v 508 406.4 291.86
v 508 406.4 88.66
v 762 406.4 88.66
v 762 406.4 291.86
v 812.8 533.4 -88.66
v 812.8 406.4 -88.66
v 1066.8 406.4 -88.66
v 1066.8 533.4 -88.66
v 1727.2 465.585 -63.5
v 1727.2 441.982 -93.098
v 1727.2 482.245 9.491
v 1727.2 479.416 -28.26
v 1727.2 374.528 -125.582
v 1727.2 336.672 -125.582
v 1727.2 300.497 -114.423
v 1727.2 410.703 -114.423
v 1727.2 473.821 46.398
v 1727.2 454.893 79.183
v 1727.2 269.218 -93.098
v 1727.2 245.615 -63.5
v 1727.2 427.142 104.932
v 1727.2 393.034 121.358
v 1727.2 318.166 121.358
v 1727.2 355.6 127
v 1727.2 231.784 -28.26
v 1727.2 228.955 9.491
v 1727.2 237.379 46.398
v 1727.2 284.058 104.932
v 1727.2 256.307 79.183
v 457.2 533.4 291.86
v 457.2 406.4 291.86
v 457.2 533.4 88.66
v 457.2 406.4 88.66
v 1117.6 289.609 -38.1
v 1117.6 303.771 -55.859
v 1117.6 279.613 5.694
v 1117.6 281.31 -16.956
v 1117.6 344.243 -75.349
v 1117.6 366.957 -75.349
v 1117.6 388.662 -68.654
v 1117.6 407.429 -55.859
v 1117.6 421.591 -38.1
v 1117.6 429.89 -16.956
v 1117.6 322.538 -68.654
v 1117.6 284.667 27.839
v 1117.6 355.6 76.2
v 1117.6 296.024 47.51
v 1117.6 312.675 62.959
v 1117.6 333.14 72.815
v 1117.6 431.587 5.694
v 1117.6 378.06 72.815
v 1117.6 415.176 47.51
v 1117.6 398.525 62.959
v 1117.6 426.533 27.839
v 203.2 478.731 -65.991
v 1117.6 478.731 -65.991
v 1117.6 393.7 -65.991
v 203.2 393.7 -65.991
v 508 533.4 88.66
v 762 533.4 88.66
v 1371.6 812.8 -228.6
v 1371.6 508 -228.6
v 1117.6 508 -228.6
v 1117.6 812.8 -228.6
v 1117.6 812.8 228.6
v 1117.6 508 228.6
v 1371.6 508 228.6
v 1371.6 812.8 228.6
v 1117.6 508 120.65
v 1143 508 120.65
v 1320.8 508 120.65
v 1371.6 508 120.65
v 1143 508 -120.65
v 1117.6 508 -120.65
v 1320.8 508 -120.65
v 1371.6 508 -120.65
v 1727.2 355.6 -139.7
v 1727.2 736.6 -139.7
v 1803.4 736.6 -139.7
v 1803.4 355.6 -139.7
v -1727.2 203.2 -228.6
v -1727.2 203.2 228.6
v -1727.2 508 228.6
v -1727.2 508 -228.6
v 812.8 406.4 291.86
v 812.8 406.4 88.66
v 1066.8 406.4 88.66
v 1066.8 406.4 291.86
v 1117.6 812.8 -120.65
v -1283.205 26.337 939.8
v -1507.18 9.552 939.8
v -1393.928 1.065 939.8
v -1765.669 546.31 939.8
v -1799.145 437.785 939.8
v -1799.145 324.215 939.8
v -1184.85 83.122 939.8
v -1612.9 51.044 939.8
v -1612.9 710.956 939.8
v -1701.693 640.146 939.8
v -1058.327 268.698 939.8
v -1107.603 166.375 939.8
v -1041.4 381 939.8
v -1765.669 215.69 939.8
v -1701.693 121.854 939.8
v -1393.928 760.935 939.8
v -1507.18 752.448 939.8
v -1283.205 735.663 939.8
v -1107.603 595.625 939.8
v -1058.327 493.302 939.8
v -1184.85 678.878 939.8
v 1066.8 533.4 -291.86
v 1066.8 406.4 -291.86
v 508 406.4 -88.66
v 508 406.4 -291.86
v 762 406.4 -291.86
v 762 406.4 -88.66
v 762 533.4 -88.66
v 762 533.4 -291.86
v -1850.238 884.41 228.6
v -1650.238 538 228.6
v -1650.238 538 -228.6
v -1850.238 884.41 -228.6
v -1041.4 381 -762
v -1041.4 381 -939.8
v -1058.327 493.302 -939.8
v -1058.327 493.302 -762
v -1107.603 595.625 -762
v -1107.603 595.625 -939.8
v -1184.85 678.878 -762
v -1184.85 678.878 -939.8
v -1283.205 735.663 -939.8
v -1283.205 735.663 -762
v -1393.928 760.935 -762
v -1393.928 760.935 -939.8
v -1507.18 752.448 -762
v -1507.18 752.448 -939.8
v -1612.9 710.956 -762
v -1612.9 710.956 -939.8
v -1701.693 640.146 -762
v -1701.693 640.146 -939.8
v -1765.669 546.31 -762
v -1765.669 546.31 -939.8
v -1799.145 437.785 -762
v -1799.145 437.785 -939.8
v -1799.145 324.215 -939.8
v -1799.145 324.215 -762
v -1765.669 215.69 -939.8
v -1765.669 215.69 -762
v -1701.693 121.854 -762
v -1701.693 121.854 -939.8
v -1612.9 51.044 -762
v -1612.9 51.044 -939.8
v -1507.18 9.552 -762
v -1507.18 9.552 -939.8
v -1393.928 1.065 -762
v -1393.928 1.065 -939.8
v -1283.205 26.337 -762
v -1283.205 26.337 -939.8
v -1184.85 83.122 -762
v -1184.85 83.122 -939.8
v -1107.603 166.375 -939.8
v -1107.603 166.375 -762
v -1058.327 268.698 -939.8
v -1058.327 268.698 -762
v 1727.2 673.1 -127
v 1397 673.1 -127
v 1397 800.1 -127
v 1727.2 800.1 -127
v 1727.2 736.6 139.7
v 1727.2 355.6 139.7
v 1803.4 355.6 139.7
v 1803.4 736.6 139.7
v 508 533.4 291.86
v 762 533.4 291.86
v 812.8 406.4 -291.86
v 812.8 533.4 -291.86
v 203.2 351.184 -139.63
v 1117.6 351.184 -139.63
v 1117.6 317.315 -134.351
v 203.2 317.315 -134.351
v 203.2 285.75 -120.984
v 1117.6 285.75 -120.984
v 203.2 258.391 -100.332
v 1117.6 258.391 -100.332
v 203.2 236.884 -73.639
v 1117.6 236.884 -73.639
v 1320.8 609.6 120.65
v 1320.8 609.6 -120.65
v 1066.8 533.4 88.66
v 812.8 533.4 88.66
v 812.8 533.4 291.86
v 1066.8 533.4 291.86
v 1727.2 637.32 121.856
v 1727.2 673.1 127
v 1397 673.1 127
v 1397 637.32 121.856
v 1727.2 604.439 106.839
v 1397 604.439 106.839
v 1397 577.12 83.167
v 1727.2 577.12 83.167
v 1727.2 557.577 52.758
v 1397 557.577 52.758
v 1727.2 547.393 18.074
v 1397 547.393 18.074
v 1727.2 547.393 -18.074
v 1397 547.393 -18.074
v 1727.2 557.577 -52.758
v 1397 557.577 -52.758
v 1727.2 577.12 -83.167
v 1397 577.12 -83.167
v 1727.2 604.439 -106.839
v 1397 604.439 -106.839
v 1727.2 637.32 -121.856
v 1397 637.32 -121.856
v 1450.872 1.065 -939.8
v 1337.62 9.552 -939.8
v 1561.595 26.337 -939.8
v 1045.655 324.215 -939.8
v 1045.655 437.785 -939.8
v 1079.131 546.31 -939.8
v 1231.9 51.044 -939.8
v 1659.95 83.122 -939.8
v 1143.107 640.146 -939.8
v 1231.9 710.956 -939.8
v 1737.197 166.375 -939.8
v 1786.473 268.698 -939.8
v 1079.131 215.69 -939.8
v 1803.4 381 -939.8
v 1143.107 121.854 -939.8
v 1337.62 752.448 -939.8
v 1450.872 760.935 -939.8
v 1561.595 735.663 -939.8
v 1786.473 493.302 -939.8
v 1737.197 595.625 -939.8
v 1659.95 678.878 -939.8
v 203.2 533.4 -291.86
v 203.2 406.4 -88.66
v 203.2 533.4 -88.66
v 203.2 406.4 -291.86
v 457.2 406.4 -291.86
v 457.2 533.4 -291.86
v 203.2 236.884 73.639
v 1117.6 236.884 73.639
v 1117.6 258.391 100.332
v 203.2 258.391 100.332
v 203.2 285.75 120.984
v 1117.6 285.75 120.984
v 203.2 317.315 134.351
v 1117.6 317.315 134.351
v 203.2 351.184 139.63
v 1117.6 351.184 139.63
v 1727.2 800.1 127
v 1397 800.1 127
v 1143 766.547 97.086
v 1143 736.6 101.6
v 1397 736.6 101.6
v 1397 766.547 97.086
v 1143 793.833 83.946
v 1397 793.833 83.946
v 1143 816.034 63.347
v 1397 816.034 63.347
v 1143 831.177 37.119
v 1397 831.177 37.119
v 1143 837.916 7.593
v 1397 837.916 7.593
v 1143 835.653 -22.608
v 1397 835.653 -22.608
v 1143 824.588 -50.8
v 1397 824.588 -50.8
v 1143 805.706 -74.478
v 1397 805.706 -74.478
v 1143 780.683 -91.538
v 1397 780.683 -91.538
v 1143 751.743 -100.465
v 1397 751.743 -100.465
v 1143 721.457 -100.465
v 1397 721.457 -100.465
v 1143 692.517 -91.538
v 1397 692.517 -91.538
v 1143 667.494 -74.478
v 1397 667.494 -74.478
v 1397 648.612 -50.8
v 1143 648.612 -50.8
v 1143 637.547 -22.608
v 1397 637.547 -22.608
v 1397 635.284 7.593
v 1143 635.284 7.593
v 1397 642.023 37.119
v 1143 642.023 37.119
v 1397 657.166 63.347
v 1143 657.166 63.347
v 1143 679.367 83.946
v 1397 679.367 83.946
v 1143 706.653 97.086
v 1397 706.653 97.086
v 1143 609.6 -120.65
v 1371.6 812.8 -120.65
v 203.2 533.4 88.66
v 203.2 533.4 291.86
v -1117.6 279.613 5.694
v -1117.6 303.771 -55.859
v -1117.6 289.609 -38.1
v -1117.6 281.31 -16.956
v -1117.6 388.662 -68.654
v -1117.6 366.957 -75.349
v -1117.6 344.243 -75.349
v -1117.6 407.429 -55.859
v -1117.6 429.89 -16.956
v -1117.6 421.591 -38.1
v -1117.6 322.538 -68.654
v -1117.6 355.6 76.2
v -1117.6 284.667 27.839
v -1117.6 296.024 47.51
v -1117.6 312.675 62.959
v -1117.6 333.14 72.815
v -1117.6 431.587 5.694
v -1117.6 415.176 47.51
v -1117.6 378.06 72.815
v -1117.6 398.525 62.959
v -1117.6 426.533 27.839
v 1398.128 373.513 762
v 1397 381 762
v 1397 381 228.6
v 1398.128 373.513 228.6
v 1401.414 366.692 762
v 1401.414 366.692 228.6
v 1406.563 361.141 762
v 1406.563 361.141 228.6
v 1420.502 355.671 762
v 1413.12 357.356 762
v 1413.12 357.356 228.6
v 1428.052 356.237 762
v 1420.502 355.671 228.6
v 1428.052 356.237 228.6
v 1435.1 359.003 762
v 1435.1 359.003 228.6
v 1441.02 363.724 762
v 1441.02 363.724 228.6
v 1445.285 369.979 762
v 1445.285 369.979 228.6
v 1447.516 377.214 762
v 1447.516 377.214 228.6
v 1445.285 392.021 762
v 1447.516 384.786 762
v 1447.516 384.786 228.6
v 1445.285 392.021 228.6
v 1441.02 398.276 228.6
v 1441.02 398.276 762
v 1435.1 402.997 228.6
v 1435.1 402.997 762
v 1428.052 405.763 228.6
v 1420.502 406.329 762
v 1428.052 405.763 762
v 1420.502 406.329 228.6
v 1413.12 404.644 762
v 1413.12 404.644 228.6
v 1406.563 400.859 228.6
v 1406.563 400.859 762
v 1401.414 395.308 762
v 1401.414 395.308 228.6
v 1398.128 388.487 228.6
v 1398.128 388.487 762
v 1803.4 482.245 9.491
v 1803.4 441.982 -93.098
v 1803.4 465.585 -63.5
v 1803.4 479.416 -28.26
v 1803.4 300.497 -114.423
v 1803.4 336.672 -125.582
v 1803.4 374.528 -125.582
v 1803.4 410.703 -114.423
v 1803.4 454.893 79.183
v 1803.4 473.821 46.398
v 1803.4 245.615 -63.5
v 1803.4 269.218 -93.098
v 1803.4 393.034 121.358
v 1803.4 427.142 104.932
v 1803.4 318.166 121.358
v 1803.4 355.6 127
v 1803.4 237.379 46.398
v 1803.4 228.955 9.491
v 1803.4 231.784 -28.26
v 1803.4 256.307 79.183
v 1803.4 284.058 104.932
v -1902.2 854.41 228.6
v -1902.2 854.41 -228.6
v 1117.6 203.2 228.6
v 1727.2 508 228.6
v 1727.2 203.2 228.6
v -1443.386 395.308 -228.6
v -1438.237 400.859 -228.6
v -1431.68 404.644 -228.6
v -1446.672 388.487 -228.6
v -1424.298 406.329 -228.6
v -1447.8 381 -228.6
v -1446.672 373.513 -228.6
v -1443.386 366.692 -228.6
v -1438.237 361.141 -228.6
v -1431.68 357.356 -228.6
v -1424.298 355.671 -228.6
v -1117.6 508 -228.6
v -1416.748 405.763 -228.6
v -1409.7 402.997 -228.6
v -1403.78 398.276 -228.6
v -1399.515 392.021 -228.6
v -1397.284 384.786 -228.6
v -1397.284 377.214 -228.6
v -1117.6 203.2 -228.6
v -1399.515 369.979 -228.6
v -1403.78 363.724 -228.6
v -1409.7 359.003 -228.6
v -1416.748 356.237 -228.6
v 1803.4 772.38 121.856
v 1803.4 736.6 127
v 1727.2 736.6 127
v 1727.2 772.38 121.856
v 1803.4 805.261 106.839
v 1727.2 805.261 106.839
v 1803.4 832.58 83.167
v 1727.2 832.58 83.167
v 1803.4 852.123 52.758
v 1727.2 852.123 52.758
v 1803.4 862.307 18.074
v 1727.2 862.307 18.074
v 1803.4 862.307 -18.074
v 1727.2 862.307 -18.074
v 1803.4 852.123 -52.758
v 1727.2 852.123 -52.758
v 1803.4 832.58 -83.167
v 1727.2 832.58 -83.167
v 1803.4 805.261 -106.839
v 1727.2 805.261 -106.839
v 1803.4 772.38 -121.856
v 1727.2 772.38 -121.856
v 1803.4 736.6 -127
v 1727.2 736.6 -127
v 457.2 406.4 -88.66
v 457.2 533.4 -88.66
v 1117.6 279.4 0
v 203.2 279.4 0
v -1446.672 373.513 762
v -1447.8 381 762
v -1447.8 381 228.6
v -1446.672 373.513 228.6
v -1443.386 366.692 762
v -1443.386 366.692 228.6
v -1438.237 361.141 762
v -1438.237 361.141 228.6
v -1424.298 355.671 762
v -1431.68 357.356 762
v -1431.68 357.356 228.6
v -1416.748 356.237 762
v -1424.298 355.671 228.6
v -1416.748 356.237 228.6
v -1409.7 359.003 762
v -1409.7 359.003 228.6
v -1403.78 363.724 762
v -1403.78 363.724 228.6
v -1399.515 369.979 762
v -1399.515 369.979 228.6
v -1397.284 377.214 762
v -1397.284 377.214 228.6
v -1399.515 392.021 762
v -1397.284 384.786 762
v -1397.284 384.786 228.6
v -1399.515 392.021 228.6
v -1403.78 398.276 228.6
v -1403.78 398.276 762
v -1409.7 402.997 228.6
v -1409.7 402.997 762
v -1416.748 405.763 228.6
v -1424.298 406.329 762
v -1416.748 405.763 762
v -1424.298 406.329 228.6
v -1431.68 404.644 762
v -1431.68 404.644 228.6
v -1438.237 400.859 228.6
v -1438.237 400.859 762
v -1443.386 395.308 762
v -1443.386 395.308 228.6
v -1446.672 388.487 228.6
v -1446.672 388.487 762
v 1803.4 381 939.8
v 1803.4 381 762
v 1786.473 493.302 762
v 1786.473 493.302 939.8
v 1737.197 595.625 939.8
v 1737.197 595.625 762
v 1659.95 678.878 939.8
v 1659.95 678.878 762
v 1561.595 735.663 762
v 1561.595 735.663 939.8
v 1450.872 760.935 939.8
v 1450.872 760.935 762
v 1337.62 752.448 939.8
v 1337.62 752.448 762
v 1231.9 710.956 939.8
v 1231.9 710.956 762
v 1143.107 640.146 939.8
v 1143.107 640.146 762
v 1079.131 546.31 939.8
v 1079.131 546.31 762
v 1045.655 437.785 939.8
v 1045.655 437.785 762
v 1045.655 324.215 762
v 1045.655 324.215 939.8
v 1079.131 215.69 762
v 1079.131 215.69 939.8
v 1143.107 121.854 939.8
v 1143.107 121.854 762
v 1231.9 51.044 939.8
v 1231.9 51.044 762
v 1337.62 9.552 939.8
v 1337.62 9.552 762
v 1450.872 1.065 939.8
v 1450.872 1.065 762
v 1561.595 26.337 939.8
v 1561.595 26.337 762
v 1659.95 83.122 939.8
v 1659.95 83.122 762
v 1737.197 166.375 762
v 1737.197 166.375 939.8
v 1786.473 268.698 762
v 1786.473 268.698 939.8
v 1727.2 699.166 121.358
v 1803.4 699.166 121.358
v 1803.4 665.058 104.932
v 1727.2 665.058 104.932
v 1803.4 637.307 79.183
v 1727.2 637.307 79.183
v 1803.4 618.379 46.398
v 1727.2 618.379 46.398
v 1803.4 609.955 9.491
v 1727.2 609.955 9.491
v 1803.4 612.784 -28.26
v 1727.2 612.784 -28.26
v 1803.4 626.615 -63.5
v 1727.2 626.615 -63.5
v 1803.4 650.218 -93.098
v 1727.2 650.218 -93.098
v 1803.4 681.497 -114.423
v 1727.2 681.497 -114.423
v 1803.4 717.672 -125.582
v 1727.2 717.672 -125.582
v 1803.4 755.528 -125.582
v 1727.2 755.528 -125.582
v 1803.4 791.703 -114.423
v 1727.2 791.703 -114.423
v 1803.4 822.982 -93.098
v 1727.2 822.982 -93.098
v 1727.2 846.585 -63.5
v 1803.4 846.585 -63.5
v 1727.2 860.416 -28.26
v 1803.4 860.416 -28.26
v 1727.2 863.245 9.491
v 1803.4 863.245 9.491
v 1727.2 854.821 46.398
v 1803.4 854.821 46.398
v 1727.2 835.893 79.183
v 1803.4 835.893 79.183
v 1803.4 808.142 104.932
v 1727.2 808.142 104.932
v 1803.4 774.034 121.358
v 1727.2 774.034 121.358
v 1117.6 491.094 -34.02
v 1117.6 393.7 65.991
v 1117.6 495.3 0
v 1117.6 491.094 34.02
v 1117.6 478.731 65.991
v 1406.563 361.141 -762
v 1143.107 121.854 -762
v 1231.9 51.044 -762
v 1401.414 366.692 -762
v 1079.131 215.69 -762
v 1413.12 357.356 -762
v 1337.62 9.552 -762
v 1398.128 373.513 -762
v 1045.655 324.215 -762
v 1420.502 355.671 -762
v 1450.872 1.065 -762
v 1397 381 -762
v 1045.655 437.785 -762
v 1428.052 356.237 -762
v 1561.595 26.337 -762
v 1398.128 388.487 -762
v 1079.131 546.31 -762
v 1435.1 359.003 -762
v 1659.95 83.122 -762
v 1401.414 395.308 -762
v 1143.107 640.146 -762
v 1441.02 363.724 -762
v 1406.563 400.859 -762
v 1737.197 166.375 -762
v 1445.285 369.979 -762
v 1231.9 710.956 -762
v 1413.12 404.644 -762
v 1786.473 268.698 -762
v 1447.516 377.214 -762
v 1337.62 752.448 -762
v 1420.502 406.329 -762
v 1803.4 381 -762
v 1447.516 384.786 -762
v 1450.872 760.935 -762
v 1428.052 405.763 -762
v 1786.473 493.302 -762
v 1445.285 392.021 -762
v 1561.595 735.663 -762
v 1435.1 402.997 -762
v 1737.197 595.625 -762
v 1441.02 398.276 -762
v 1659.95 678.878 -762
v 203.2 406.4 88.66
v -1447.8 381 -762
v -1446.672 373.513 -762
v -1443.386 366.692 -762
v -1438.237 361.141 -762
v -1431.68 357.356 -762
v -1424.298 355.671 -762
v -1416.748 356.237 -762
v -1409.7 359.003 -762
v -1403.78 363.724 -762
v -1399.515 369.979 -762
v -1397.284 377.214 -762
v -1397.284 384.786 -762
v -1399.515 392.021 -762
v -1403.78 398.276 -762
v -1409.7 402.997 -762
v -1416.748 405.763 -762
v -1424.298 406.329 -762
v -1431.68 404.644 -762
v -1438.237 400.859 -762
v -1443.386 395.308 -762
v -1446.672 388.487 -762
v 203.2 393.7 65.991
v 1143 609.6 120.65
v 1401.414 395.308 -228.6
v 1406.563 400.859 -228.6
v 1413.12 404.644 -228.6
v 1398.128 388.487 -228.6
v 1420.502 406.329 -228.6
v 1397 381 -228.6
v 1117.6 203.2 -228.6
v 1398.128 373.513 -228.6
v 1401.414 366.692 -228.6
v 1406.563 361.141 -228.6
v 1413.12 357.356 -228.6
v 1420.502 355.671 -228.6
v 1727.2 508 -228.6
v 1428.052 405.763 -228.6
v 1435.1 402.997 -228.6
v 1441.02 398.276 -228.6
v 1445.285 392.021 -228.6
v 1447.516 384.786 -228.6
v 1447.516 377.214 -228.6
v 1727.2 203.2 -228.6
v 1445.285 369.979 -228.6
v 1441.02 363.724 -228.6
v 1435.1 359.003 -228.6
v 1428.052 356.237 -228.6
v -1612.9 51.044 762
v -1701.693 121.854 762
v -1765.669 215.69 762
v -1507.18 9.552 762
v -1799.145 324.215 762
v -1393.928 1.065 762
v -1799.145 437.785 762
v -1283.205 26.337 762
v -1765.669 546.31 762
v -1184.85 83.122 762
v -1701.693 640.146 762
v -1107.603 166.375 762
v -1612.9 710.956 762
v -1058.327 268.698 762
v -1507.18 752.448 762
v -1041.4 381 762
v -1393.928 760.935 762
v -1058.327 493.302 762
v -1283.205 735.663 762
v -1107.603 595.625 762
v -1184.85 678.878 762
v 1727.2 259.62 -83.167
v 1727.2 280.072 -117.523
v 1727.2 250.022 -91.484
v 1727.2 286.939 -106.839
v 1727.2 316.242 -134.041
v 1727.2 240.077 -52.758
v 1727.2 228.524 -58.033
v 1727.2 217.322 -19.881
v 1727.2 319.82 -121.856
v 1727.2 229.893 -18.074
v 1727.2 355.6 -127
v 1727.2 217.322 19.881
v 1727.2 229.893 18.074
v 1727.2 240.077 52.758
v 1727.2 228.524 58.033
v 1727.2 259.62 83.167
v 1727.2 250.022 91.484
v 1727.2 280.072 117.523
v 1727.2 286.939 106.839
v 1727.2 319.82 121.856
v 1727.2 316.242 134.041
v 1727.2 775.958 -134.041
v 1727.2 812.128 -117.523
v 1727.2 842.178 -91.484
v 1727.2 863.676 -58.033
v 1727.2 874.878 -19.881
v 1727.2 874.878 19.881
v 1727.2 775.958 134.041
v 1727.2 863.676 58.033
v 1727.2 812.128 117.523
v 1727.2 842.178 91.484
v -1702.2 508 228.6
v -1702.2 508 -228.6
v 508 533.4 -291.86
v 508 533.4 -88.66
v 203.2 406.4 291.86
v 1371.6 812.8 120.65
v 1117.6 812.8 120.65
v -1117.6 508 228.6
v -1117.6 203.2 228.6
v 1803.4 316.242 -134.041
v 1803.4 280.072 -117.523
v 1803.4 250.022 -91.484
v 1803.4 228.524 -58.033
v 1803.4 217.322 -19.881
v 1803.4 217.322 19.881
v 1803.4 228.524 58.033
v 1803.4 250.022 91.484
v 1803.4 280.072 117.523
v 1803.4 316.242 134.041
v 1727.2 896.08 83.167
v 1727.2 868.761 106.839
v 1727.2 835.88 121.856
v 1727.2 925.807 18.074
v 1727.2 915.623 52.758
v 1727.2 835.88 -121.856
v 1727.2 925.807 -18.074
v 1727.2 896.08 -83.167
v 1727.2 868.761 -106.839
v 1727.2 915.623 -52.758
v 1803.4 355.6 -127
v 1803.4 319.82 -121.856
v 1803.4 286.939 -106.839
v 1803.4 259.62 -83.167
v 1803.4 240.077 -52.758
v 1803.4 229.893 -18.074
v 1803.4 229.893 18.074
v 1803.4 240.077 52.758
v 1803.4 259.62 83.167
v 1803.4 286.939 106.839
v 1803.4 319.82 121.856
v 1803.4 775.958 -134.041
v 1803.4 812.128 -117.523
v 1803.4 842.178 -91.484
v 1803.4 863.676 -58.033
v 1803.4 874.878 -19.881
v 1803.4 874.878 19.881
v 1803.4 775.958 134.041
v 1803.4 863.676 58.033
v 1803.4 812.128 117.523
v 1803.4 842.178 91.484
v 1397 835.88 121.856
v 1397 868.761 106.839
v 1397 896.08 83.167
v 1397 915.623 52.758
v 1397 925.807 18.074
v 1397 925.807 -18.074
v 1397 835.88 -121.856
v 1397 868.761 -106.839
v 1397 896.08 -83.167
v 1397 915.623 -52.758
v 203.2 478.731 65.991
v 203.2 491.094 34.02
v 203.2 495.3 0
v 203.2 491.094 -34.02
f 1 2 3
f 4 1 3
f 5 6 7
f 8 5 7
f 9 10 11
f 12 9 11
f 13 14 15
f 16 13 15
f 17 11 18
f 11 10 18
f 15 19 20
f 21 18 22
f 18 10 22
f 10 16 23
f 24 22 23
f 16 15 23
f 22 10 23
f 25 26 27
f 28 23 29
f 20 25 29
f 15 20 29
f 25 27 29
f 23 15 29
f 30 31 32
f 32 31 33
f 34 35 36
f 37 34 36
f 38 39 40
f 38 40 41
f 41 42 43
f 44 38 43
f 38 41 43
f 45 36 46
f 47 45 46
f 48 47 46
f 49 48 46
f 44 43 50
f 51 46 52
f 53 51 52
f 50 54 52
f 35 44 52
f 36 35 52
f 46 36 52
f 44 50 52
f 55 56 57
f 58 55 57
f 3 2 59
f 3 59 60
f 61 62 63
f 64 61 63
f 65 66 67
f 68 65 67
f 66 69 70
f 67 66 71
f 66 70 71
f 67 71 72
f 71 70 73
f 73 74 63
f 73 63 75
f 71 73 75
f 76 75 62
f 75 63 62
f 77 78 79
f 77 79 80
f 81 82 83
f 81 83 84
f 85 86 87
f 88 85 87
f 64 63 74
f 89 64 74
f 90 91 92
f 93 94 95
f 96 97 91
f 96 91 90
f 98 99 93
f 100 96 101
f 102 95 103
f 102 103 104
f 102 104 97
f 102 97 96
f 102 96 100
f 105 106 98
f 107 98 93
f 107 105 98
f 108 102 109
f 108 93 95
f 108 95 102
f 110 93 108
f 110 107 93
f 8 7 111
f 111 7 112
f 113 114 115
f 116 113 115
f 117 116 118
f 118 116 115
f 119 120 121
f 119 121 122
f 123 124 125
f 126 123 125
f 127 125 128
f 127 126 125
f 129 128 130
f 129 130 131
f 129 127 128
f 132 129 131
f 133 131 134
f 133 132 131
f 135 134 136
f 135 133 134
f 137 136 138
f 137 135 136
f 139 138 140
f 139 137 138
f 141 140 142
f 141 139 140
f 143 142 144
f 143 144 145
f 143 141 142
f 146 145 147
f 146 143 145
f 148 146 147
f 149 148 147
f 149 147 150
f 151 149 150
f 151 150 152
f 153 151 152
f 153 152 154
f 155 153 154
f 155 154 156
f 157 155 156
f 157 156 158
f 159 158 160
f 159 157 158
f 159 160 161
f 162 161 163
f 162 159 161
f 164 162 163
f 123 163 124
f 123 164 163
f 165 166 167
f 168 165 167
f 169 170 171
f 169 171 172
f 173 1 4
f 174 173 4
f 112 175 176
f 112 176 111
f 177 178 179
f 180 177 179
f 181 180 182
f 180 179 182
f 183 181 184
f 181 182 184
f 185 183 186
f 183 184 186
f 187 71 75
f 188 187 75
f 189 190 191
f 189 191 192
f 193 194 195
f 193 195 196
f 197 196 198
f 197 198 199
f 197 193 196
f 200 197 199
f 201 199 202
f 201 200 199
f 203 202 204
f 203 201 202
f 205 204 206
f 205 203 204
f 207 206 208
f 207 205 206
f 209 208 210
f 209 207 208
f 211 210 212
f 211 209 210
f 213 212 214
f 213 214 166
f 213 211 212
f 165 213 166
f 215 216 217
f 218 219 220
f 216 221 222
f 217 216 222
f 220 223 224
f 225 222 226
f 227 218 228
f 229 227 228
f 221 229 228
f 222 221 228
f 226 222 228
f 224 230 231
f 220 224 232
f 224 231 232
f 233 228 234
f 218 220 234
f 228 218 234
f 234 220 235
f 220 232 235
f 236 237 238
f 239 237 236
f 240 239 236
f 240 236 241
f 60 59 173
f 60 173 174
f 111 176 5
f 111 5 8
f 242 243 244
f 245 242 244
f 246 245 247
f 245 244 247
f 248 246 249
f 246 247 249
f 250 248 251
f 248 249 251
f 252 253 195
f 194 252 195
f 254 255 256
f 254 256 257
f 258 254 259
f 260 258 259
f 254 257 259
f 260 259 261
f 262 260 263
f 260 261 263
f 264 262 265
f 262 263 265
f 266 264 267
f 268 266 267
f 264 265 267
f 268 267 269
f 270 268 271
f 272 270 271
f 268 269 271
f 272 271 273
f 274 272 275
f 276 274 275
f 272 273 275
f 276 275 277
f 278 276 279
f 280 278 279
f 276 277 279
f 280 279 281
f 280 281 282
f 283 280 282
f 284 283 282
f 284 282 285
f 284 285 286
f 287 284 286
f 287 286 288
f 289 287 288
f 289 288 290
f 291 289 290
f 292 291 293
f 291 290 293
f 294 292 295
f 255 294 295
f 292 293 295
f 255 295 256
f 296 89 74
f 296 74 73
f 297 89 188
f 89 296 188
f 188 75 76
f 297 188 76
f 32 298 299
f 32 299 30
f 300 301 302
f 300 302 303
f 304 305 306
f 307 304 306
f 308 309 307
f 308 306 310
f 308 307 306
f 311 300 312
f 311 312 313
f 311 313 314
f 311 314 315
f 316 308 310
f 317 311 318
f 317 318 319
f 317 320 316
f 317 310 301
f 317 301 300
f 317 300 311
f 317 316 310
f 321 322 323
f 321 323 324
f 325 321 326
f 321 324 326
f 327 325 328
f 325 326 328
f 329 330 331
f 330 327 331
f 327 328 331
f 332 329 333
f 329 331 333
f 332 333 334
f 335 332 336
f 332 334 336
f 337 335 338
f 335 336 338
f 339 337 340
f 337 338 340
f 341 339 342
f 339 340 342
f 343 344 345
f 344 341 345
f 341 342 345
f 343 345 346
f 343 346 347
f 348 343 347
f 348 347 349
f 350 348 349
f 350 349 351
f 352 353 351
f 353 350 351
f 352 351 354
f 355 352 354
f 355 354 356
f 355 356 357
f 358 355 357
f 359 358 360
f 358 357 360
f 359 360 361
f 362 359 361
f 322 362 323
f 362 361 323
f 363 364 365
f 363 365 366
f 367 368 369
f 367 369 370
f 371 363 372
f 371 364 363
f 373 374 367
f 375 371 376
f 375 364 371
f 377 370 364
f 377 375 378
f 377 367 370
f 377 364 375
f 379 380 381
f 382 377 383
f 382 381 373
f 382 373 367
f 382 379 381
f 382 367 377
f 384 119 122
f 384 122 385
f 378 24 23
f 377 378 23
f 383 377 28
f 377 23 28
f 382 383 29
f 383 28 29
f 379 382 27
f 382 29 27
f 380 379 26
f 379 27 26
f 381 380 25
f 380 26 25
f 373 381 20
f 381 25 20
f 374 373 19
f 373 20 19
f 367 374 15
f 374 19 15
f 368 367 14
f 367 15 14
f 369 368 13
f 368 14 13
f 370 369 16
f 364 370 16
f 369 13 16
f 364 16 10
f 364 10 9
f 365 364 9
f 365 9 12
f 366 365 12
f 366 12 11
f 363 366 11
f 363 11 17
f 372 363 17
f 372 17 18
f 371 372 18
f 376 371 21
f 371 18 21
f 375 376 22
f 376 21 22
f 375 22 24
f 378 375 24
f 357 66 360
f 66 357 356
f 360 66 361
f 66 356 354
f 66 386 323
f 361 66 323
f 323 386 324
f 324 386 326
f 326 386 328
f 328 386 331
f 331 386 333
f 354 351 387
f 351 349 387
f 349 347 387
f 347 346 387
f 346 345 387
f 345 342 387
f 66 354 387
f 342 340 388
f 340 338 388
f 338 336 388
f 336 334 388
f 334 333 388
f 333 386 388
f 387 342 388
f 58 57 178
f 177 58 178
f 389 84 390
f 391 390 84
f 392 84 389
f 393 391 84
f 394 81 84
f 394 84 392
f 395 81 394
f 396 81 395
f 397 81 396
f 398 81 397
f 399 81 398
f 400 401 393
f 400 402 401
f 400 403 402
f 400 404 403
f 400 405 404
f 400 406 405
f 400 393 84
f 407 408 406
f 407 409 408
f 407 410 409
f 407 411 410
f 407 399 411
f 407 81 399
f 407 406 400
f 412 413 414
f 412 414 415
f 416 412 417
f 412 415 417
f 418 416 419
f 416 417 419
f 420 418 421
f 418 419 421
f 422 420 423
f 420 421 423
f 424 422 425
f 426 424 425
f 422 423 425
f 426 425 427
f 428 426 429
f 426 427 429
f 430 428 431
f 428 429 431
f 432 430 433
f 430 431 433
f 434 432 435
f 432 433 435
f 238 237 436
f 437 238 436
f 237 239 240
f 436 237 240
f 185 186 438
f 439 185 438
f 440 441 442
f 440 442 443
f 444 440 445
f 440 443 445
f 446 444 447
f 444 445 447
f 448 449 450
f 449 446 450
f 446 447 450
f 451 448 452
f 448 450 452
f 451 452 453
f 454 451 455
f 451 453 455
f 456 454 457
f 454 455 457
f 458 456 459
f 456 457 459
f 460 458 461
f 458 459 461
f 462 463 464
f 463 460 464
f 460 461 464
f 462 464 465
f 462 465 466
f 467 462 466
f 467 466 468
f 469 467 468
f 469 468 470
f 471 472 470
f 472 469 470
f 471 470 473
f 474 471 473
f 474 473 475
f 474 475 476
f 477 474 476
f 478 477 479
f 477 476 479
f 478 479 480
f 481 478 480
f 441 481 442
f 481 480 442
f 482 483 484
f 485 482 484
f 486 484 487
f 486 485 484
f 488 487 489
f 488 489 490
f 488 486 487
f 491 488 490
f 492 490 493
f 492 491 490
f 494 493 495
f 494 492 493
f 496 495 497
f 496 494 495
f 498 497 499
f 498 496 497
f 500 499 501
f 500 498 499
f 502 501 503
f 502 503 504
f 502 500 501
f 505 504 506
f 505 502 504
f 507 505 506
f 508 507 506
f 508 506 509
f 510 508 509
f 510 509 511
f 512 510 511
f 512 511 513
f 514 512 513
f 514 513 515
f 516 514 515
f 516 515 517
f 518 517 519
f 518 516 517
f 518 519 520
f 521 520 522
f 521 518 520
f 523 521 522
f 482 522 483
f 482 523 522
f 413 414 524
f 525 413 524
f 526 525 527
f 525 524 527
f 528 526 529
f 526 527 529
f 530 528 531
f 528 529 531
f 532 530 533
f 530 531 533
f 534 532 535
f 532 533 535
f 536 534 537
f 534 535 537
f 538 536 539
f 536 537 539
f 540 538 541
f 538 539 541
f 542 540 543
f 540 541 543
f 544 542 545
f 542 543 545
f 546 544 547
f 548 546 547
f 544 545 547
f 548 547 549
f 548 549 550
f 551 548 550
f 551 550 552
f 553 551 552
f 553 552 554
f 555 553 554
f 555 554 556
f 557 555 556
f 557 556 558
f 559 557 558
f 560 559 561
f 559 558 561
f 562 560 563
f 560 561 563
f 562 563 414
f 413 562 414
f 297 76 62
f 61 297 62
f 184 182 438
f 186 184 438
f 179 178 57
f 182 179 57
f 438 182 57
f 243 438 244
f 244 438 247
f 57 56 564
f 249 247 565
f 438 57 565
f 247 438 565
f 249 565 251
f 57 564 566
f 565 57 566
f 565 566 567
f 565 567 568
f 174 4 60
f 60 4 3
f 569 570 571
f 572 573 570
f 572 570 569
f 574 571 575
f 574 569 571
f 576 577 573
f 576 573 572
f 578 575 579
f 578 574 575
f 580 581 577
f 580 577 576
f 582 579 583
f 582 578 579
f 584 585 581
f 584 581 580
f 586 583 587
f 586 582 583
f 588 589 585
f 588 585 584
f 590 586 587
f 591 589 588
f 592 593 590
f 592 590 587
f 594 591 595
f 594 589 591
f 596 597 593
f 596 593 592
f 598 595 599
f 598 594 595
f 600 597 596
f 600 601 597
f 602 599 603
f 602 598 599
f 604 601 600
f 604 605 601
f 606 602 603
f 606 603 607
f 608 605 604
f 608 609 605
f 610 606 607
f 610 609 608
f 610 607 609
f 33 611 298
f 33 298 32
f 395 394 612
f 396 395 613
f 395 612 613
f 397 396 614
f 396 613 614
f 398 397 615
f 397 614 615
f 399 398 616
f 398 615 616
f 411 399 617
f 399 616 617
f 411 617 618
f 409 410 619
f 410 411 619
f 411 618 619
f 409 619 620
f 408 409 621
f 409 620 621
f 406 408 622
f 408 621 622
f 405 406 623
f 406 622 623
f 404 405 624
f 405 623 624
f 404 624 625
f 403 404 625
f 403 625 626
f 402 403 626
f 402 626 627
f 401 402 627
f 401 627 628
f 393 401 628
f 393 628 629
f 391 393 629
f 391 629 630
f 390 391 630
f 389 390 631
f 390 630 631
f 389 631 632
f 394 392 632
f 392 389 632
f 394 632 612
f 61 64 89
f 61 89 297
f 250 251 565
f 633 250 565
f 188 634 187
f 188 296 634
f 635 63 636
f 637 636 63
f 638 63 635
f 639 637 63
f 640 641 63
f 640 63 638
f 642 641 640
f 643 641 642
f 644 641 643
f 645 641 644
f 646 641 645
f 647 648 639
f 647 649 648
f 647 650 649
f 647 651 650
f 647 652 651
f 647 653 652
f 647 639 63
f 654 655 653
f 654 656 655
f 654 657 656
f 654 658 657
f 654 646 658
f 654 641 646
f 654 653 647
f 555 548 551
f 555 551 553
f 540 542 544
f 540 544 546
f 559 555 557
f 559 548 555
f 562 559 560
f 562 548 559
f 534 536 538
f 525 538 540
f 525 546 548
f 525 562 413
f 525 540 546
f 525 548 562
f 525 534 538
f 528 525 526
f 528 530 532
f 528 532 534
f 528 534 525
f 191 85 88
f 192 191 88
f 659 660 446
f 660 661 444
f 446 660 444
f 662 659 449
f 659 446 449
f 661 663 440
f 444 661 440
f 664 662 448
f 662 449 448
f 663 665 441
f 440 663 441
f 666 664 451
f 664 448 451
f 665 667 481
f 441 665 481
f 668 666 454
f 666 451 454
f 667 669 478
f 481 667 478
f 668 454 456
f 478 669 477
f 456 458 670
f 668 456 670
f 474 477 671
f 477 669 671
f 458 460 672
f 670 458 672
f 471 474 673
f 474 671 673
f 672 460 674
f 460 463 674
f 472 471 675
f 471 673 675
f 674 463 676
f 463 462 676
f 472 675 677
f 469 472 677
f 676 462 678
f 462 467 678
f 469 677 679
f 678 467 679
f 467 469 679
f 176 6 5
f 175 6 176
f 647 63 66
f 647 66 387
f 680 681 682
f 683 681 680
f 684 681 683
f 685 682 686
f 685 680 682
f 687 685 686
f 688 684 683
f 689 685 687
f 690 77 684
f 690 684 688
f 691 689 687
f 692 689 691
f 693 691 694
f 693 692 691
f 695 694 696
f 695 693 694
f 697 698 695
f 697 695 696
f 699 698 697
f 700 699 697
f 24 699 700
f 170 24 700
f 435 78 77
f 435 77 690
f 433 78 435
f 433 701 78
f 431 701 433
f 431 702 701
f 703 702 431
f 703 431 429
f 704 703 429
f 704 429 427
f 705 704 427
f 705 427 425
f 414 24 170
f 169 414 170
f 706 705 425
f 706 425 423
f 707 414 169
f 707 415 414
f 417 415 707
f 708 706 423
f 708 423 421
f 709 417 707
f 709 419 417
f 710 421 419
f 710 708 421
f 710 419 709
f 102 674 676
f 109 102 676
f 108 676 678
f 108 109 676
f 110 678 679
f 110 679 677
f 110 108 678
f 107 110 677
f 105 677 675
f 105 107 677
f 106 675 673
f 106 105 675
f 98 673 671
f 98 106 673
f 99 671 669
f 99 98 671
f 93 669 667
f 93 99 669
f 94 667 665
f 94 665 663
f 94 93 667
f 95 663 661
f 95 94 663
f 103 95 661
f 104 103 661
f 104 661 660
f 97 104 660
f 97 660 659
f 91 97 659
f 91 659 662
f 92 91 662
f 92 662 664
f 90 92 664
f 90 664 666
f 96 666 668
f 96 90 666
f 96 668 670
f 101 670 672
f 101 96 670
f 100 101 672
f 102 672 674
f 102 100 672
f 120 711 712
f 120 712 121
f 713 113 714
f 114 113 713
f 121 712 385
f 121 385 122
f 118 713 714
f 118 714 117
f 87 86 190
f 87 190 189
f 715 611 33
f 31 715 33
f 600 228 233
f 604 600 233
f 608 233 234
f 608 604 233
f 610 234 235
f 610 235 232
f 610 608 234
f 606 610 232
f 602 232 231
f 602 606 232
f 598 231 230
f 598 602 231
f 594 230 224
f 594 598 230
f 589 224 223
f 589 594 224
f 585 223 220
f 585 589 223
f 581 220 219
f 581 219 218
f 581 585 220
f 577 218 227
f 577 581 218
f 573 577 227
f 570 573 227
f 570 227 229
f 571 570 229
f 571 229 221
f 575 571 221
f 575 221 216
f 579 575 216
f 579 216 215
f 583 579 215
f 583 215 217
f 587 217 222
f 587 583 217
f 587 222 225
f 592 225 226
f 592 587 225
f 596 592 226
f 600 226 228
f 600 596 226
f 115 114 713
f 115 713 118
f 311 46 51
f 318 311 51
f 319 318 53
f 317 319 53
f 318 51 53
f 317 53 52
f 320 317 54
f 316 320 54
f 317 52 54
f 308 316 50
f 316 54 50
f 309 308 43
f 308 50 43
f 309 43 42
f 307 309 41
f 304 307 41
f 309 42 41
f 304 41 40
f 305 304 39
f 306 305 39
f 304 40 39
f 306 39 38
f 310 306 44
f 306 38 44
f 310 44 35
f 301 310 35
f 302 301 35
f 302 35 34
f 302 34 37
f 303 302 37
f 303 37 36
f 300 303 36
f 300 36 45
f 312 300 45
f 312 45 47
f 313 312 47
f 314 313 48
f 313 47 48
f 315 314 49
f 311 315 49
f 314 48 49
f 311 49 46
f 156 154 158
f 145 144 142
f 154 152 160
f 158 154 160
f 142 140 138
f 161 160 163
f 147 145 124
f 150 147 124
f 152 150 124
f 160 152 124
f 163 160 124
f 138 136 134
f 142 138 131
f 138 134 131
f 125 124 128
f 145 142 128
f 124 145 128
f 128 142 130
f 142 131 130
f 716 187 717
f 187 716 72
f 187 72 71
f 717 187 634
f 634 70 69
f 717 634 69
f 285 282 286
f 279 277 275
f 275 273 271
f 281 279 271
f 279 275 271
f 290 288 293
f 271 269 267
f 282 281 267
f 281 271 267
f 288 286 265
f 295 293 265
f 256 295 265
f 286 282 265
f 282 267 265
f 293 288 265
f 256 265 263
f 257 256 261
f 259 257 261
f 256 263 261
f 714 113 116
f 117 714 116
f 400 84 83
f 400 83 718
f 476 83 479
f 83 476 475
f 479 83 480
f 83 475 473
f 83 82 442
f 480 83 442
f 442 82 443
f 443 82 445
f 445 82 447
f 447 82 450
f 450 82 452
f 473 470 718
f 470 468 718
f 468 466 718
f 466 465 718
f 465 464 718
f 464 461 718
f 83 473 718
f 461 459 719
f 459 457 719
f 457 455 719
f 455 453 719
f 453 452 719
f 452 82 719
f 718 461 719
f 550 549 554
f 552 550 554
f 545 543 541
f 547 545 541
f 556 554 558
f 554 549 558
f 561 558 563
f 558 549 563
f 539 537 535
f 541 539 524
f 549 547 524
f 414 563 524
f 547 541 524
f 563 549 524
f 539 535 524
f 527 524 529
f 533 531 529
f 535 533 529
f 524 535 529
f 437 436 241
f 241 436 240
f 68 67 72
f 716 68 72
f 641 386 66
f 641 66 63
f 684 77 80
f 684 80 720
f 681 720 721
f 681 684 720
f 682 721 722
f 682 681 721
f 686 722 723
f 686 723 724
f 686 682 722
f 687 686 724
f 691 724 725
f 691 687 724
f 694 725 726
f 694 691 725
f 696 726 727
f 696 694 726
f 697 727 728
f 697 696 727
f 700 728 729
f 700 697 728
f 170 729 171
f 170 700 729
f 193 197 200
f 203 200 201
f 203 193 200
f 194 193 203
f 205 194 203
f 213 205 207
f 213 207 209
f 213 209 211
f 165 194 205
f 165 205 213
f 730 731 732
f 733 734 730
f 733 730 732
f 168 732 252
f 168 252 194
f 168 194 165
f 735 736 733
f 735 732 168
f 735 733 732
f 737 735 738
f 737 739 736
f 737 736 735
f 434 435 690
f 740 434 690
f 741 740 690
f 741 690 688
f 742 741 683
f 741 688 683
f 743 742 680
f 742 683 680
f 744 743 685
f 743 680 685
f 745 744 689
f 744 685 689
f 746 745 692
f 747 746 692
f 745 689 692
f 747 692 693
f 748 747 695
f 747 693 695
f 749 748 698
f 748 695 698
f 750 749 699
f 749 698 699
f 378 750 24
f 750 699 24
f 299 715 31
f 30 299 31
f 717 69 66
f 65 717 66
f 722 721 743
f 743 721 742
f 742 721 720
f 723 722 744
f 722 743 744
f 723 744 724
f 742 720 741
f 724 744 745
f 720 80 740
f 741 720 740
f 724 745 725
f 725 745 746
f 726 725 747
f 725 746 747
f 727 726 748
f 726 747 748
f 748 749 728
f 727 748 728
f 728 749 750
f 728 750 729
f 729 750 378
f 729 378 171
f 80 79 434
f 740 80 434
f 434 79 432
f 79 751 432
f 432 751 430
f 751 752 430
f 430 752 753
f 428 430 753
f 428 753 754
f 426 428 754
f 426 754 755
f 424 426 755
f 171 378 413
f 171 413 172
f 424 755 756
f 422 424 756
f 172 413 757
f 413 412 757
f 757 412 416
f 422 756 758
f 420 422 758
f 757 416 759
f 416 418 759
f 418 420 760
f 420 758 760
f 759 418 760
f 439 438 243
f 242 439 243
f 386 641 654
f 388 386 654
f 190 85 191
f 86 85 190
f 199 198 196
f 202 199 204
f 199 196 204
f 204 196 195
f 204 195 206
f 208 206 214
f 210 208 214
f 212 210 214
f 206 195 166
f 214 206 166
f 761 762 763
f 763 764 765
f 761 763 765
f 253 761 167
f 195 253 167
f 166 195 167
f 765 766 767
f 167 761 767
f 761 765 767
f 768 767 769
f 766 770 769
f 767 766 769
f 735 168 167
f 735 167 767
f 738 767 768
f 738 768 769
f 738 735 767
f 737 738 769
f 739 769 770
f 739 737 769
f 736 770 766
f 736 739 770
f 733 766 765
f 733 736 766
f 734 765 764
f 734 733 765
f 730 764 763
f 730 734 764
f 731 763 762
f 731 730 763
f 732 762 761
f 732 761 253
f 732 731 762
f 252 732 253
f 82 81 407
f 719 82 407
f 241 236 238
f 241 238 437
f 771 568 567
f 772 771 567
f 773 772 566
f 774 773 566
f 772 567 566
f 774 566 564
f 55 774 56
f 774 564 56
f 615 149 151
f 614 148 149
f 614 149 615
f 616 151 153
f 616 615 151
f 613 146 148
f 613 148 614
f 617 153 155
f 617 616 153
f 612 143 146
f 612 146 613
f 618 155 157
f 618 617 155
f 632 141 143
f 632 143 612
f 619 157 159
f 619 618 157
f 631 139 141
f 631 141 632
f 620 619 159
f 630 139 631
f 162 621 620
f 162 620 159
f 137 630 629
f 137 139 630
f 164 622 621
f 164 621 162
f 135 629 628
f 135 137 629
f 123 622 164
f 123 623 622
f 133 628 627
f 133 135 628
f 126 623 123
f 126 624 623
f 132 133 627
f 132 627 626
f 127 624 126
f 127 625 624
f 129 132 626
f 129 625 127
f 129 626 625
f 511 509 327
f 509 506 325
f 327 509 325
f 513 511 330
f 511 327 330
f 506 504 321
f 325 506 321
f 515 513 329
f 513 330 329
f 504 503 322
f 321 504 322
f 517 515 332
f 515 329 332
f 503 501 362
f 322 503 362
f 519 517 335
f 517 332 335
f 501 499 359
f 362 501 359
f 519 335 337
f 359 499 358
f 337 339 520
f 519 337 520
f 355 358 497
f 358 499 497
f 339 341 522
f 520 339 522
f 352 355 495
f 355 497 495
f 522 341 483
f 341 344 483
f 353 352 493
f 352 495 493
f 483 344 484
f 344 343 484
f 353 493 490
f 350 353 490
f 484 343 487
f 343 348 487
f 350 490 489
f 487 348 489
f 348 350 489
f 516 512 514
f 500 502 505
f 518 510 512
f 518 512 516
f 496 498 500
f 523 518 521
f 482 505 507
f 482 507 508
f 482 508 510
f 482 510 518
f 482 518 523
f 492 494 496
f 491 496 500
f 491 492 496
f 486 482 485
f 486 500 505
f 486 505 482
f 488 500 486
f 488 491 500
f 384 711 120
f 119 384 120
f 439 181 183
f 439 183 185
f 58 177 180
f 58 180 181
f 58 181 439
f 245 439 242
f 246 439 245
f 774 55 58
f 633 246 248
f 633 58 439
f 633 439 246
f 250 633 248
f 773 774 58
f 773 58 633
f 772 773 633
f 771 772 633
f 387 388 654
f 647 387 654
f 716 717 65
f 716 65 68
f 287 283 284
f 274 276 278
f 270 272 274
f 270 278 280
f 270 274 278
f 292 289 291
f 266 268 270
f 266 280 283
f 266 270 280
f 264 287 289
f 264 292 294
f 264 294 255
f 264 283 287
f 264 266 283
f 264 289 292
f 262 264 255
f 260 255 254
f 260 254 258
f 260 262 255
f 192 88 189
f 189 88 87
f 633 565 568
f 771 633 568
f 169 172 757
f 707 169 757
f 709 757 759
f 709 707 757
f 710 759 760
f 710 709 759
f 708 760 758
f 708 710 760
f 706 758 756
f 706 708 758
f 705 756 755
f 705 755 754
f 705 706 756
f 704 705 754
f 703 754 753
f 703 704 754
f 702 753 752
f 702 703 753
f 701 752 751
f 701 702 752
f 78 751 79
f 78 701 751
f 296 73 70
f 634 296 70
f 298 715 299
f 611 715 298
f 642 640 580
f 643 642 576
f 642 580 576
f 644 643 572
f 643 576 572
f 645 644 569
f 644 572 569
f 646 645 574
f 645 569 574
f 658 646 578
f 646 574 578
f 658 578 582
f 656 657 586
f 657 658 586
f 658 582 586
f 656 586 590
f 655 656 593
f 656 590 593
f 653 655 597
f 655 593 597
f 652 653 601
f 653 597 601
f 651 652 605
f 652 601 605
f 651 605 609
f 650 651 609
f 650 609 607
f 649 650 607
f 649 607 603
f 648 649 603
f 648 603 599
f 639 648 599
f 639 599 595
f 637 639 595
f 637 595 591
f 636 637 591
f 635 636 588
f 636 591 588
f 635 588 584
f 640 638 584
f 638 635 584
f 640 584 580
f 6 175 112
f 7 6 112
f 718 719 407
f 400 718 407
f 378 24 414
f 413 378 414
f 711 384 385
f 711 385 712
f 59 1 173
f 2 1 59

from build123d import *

# Parameters (mm, degrees)
SKETCH4_R              = 381
BOSS_EXTRUDE1_DEPTH    = 88.9
BOSS_EXTRUDE1_2_DEPTH  = 88.9
SKETCH3_R              = 381
BOSS_EXTRUDE2_DEPTH    = 88.9
BOSS_EXTRUDE2_2_DEPTH  = 88.9
BOSS_EXTRUDE3_START    = 203.2
SKETCH1_W              = 609.6
SKETCH1_H              = 457.2
BOSS_EXTRUDE3_DEPTH    = 304.8
BOSS_EXTRUDE3_2_DEPTH  = 304.8
SKETCH5_R              = 76.2
BOSS_EXTRUDE4_DEPTH    = 914.4
SKETCH5_3_R            = 76.2
BOSS_EXTRUDE5_DEPTH    = 2235.2
SKETCH6_R              = 127
BOSS_EXTRUDE6_DEPTH    = 76.2
BOSS_EXTRUDE6_2_DEPTH  = 76.2
BOSS_EXTRUDE8_DEPTH    = 330.2
SKETCH9_R              = 101.6
BOSS_EXTRUDE9_DEPTH    = 254
BOSS_EXTRUDE10_DEPTH   = 76.2
SKETCH11_W             = 254
SKETCH11_H             = 203.2
BOSS_EXTRUDE11_DEPTH   = 127
BOSS_EXTRUDE11_2_DEPTH = 127
BOSS_EXTRUDE11_3_DEPTH = 127
BOSS_EXTRUDE11_4_DEPTH = 127
BOSS_EXTRUDE11_5_DEPTH = 127
BOSS_EXTRUDE11_6_DEPTH = 127
BOSS_EXTRUDE12_DEPTH   = 304.8
BOSS_EXTRUDE12_2_DEPTH = 304.8
SKETCH12_3_W           = 177.8
SKETCH12_3_H           = 120.65
BOSS_EXTRUDE13_DEPTH   = 101.6
BOSS_EXTRUDE15_REACH   = 2649.242
SKETCH13_R             = 25.4
BOSS_EXTRUDE16_DEPTH   = 457.2


with BuildPart() as part:
    # Sketch4 → Boss-Extrude1 (new, symmetric)
    with BuildSketch(Plane.XY.offset(-850.9)):
        with Locations((1422.4, 381)):
            Circle(SKETCH4_R)
    extrude(amount=BOSS_EXTRUDE1_DEPTH, both=True)


with BuildPart() as body_2:
    # Sketch4 → Boss-Extrude1 2 (new, symmetric)
    with BuildSketch(Plane.XY.offset(-850.9)):
        with Locations((-1422.4, 381)):
            Circle(SKETCH4_R)
    extrude(amount=BOSS_EXTRUDE1_2_DEPTH, both=True)


with BuildPart() as body_3:
    # Sketch3 → Boss-Extrude2 (new, symmetric)
    with BuildSketch(Plane.XY.offset(850.9)):
        with Locations((1422.4, 381)):
            Circle(SKETCH3_R)
    extrude(amount=BOSS_EXTRUDE2_DEPTH, both=True)


with BuildPart() as body_4:
    # Sketch3 → Boss-Extrude2 2 (new, symmetric)
    with BuildSketch(Plane.XY.offset(850.9)):
        with Locations((-1422.4, 381)):
            Circle(SKETCH3_R)
    extrude(amount=BOSS_EXTRUDE2_2_DEPTH, both=True)

    # Boss-Extrude15: up to this face of the body (flat: up to its plane)
    boss_extrude15_end = Plane(body_4.part.faces().sort_by_distance((-1422.4, 381, 762))[0])
    # Sketch13 → Boss-Extrude15 (add, up to the picked face)
    with BuildSketch(Plane.XY.offset(-762), mode=Mode.PRIVATE) as boss_extrude15_sk1:
        with Locations(Location((-1422.4, 381, 0), (0, 0, 180))):
            Circle(SKETCH13_R)
    boss_extrude15_tool1 = split(extrude(boss_extrude15_sk1.sketch, amount=BOSS_EXTRUDE15_REACH, mode=Mode.PRIVATE), bisect_by=boss_extrude15_end, keep=Keep.BOTH, mode=Mode.PRIVATE)
    # Sketch13 → Boss-Extrude15 (add, up to the picked face)
    with BuildSketch(Plane.XY.offset(-762), mode=Mode.PRIVATE) as boss_extrude15_sk2:
        with Locations(Location((1422.4, 381, 0), (0, 0, 180))):
            Circle(SKETCH13_R)
    boss_extrude15_tool2 = split(extrude(boss_extrude15_sk2.sketch, amount=BOSS_EXTRUDE15_REACH, mode=Mode.PRIVATE), bisect_by=boss_extrude15_end, keep=Keep.BOTH, mode=Mode.PRIVATE)

    add(part.part)  # Boss-Extrude15 merges part

    add(body_2.part)  # Boss-Extrude15 merges body 2

    add(body_3.part)  # Boss-Extrude15 merges body 3


with BuildPart() as body_5:
    # Sketch1 → Boss-Extrude3 (new body)
    with BuildSketch(Plane(origin=(0, 0, 0), x_dir=(1, 0, 0), z_dir=(0, 1, 0)).offset(BOSS_EXTRUDE3_START)):
        with Locations((1422.4, 0)):
            Rectangle(SKETCH1_W, SKETCH1_H)
    extrude(amount=BOSS_EXTRUDE3_DEPTH)


with BuildPart() as body_6:
    # Sketch1 → Boss-Extrude3 2 (new body)
    with BuildSketch(Plane(origin=(0, 0, 0), x_dir=(1, 0, 0), z_dir=(0, 1, 0)).offset(BOSS_EXTRUDE3_START)):
        with Locations((-1422.4, 0)):
            Rectangle(SKETCH1_W, SKETCH1_H)
    extrude(amount=BOSS_EXTRUDE3_2_DEPTH)


with BuildPart() as body_7:
    # Sketch5 → Boss-Extrude4 (new body)
    with BuildSketch(Plane.ZY.offset(-1117.6)):
        with BuildLine():
            Line((-65.991135768, 478.731068378), (-65.991135768, 393.7))
            ThreePointArc((-65.991135768, 393.7), (0, 431.8), (65.991135768, 393.7))
            Line((65.991135768, 393.7), (65.991135768, 478.731068378))
            ThreePointArc((65.991135768, 478.731068378), (0, 495.3), (-65.991135768, 478.731068378))
        make_face()
        with BuildLine():
            Line((139.630201095, 351.184465811), (65.991135768, 393.7))
            ThreePointArc((65.991135768, 393.7), (73.603547963, 375.322011237), (76.2, 355.6))
            ThreePointArc((76.2, 355.6), (53.881536726, 301.718463274), (0, 279.4))
            Line((0, 279.4), (73.639065327, 236.884465811))
            ThreePointArc((73.639065327, 236.884465811), (120.983748909, 285.75), (139.630201095, 351.184465811))
        make_face()
        with BuildLine():
            ThreePointArc((0, 279.4), (-65.991135768, 317.5), (-65.991135768, 393.7))
            Line((-65.991135768, 393.7), (-139.630201095, 351.184465811))
            ThreePointArc((-139.630201095, 351.184465811), (-120.983748909, 285.75), (-73.639065327, 236.884465811))
            Line((-73.639065327, 236.884465811), (0, 279.4))
        make_face()
        with Locations((0, 355.6)):
            Circle(SKETCH5_R)
    extrude(amount=BOSS_EXTRUDE4_DEPTH)


with BuildPart() as body_8:
    # Sketch5<3> → Boss-Extrude5 (new body)
    with BuildSketch(Plane.ZY.offset(-1117.6)):
        with Locations((0, 355.6)):
            Circle(SKETCH5_3_R)
    extrude(amount=BOSS_EXTRUDE5_DEPTH)


with BuildPart() as body_9:
    # Sketch6 → Boss-Extrude6 (new body)
    with BuildSketch(Plane(origin=(1727.2, 0, 0), x_dir=(0, 0, -1), z_dir=(1, 0, 0))):
        with Locations(Location((0, 355.6, 0), (0, 0, 180))):
            Circle(SKETCH6_R)
    extrude(amount=BOSS_EXTRUDE6_DEPTH)


with BuildPart() as body_10:
    # Sketch6 → Boss-Extrude6 2 (new body)
    with BuildSketch(Plane(origin=(1727.2, 0, 0), x_dir=(0, 0, -1), z_dir=(1, 0, 0))):
        with Locations(Location((0, 736.6, 0), (0, 0, 180))):
            Circle(SKETCH6_R)
    extrude(amount=BOSS_EXTRUDE6_2_DEPTH)


with BuildPart() as body_11:
    # Sketch8 → Boss-Extrude8 (new body)
    with BuildSketch(Plane.ZY.offset(-1727.2)):
        with BuildLine():
            Line((-127, 673.1), (-127, 800.1))
            ThreePointArc((-127, 800.1), (0, 927.1), (127, 800.1))
            Line((127, 800.1), (127, 673.1))
            ThreePointArc((127, 673.1), (0, 546.1), (-127, 673.1))
        make_face()
    extrude(amount=BOSS_EXTRUDE8_DEPTH)


with BuildPart() as body_12:
    # Sketch9 → Boss-Extrude9 (new body)
    with BuildSketch(Plane.ZY.offset(-1397)):
        with Locations((0, 736.6)):
            Circle(SKETCH9_R)
    extrude(amount=BOSS_EXTRUDE9_DEPTH)


with BuildPart() as body_13:
    # Sketch6<3> → Boss-Extrude10 (new body)
    with BuildSketch(Plane(origin=(1727.2, 0, 0), x_dir=(0, 0, -1), z_dir=(1, 0, 0))):
        with BuildLine():
            Line((139.7, 736.6), (139.7, 355.6))
            ThreePointArc((139.7, 355.6), (0, 215.9), (-139.7, 355.6))
            Line((-139.7, 355.6), (-139.7, 736.6))
            ThreePointArc((-139.7, 736.6), (0, 876.3), (139.7, 736.6))
        make_face()
        with BuildLine():
            Line((-127, 355.6), (-127, 736.6))
            ThreePointArc((-127, 736.6), (0, 863.6), (127, 736.6))
            Line((127, 736.6), (127, 355.6))
            ThreePointArc((127, 355.6), (0, 228.6), (-127, 355.6))
        make_face(mode=Mode.SUBTRACT)
    extrude(amount=BOSS_EXTRUDE10_DEPTH)


with BuildPart() as body_14:
    # Sketch11 → Boss-Extrude11 (new body)
    with BuildSketch(Plane(origin=(0, 406.4, 0), x_dir=(1, 0, 0), z_dir=(0, 1, 0))):
        with Locations((635, -190.260072631)):
            Rectangle(SKETCH11_W, SKETCH11_H)
    extrude(amount=BOSS_EXTRUDE11_DEPTH)


with BuildPart() as body_15:
    # Sketch11 → Boss-Extrude11 2 (new body)
    with BuildSketch(Plane(origin=(0, 406.4, 0), x_dir=(1, 0, 0), z_dir=(0, 1, 0))):
        with Locations((330.2, -190.260072631)):
            Rectangle(SKETCH11_W, SKETCH11_H)
    extrude(amount=BOSS_EXTRUDE11_2_DEPTH)


with BuildPart() as body_16:
    # Sketch11 → Boss-Extrude11 3 (new body)
    with BuildSketch(Plane(origin=(0, 406.4, 0), x_dir=(1, 0, 0), z_dir=(0, 1, 0))):
        with Locations((939.8, -190.260072631)):
            Rectangle(SKETCH11_W, SKETCH11_H)
    extrude(amount=BOSS_EXTRUDE11_3_DEPTH)


with BuildPart() as body_17:
    # Sketch11 → Boss-Extrude11 4 (new body)
    with BuildSketch(Plane(origin=(0, 406.4, 0), x_dir=(1, 0, 0), z_dir=(0, 1, 0))):
        with Locations((939.8, 190.260072631)):
            Rectangle(SKETCH11_W, SKETCH11_H)
    extrude(amount=BOSS_EXTRUDE11_4_DEPTH)


with BuildPart() as body_18:
    # Sketch11 → Boss-Extrude11 5 (new body)
    with BuildSketch(Plane(origin=(0, 406.4, 0), x_dir=(1, 0, 0), z_dir=(0, 1, 0))):
        with Locations((635, 190.260072631)):
            Rectangle(SKETCH11_W, SKETCH11_H)
    extrude(amount=BOSS_EXTRUDE11_5_DEPTH)


with BuildPart() as body_19:
    # Sketch11 → Boss-Extrude11 6 (new body)
    with BuildSketch(Plane(origin=(0, 406.4, 0), x_dir=(1, 0, 0), z_dir=(0, 1, 0))):
        with Locations((330.2, 190.260072631)):
            Rectangle(SKETCH11_W, SKETCH11_H)
    extrude(amount=BOSS_EXTRUDE11_6_DEPTH)


with BuildPart() as body_20:
    # Sketch12 → Boss-Extrude12 (new body)
    with BuildSketch(Plane(origin=(0, 508, 0), x_dir=(1, 0, 0), z_dir=(0, 1, 0))):
        Polygon((1371.6, 228.6), (1117.6, 228.6), (1117.6, 120.65), (1143, 120.65), (1320.8, 120.65), (1371.6, 120.65), align=None)
    extrude(amount=BOSS_EXTRUDE12_DEPTH)



with BuildPart() as body_21:
    # Sketch12 → Boss-Extrude12 2 (new body)
    with BuildSketch(Plane(origin=(0, 508, 0), x_dir=(1, 0, 0), z_dir=(0, 1, 0))):
        Polygon((1143, -120.65), (1117.6, -120.65), (1117.6, -228.6), (1371.6, -228.6), (1371.6, -120.65), (1320.8, -120.65), align=None)
    extrude(amount=BOSS_EXTRUDE12_2_DEPTH)


with BuildPart() as body_20_1:
    add(body_20.part)

    add(body_21.part)  # Boss-Extrude13 merges body 21
    # Sketch12<3> → Boss-Extrude13 (add)
    with BuildSketch(Plane(origin=(0, 508, 0), x_dir=(1, 0, 0), z_dir=(0, 1, 0))):
        with Locations((1231.9, -60.325)):
            Rectangle(SKETCH12_3_W, SKETCH12_3_H)
        with Locations((1231.9, 60.325)):
            Rectangle(SKETCH12_3_W, SKETCH12_3_H)
    extrude(amount=BOSS_EXTRUDE13_DEPTH)


with BuildPart() as body_4_1:
    add(body_4.part)

    add(body_5.part)  # Boss-Extrude15 merges body 5

    add(body_6.part)  # Boss-Extrude15 merges body 6
    add(boss_extrude15_tool1.solids().sort_by(Axis((-1422.4, 381, -762), (0, 0, 1)))[0])
    add(boss_extrude15_tool2.solids().sort_by(Axis((1422.4, 381, -762), (0, 0, 1)))[0])


with BuildPart() as body_16_2:
    # Sketch15 → Boss-Extrude16 (new body)
    with BuildSketch(Plane.XY.offset(228.6)):
        Polygon((-1902.2, 854.410161514), (-1702.2, 508), (-1650.238475773, 538), (-1850.238475773, 884.410161514), align=None)
    extrude(amount=-BOSS_EXTRUDE16_DEPTH)


solid = Compound([body_7.part, body_8.part, body_9.part, body_10.part, body_11.part, body_12.part, body_13.part, body_14.part, body_15.part, body_16.part, body_17.part, body_18.part, body_19.part, body_20_1.part, body_4_1.part, body_16_2.part])
